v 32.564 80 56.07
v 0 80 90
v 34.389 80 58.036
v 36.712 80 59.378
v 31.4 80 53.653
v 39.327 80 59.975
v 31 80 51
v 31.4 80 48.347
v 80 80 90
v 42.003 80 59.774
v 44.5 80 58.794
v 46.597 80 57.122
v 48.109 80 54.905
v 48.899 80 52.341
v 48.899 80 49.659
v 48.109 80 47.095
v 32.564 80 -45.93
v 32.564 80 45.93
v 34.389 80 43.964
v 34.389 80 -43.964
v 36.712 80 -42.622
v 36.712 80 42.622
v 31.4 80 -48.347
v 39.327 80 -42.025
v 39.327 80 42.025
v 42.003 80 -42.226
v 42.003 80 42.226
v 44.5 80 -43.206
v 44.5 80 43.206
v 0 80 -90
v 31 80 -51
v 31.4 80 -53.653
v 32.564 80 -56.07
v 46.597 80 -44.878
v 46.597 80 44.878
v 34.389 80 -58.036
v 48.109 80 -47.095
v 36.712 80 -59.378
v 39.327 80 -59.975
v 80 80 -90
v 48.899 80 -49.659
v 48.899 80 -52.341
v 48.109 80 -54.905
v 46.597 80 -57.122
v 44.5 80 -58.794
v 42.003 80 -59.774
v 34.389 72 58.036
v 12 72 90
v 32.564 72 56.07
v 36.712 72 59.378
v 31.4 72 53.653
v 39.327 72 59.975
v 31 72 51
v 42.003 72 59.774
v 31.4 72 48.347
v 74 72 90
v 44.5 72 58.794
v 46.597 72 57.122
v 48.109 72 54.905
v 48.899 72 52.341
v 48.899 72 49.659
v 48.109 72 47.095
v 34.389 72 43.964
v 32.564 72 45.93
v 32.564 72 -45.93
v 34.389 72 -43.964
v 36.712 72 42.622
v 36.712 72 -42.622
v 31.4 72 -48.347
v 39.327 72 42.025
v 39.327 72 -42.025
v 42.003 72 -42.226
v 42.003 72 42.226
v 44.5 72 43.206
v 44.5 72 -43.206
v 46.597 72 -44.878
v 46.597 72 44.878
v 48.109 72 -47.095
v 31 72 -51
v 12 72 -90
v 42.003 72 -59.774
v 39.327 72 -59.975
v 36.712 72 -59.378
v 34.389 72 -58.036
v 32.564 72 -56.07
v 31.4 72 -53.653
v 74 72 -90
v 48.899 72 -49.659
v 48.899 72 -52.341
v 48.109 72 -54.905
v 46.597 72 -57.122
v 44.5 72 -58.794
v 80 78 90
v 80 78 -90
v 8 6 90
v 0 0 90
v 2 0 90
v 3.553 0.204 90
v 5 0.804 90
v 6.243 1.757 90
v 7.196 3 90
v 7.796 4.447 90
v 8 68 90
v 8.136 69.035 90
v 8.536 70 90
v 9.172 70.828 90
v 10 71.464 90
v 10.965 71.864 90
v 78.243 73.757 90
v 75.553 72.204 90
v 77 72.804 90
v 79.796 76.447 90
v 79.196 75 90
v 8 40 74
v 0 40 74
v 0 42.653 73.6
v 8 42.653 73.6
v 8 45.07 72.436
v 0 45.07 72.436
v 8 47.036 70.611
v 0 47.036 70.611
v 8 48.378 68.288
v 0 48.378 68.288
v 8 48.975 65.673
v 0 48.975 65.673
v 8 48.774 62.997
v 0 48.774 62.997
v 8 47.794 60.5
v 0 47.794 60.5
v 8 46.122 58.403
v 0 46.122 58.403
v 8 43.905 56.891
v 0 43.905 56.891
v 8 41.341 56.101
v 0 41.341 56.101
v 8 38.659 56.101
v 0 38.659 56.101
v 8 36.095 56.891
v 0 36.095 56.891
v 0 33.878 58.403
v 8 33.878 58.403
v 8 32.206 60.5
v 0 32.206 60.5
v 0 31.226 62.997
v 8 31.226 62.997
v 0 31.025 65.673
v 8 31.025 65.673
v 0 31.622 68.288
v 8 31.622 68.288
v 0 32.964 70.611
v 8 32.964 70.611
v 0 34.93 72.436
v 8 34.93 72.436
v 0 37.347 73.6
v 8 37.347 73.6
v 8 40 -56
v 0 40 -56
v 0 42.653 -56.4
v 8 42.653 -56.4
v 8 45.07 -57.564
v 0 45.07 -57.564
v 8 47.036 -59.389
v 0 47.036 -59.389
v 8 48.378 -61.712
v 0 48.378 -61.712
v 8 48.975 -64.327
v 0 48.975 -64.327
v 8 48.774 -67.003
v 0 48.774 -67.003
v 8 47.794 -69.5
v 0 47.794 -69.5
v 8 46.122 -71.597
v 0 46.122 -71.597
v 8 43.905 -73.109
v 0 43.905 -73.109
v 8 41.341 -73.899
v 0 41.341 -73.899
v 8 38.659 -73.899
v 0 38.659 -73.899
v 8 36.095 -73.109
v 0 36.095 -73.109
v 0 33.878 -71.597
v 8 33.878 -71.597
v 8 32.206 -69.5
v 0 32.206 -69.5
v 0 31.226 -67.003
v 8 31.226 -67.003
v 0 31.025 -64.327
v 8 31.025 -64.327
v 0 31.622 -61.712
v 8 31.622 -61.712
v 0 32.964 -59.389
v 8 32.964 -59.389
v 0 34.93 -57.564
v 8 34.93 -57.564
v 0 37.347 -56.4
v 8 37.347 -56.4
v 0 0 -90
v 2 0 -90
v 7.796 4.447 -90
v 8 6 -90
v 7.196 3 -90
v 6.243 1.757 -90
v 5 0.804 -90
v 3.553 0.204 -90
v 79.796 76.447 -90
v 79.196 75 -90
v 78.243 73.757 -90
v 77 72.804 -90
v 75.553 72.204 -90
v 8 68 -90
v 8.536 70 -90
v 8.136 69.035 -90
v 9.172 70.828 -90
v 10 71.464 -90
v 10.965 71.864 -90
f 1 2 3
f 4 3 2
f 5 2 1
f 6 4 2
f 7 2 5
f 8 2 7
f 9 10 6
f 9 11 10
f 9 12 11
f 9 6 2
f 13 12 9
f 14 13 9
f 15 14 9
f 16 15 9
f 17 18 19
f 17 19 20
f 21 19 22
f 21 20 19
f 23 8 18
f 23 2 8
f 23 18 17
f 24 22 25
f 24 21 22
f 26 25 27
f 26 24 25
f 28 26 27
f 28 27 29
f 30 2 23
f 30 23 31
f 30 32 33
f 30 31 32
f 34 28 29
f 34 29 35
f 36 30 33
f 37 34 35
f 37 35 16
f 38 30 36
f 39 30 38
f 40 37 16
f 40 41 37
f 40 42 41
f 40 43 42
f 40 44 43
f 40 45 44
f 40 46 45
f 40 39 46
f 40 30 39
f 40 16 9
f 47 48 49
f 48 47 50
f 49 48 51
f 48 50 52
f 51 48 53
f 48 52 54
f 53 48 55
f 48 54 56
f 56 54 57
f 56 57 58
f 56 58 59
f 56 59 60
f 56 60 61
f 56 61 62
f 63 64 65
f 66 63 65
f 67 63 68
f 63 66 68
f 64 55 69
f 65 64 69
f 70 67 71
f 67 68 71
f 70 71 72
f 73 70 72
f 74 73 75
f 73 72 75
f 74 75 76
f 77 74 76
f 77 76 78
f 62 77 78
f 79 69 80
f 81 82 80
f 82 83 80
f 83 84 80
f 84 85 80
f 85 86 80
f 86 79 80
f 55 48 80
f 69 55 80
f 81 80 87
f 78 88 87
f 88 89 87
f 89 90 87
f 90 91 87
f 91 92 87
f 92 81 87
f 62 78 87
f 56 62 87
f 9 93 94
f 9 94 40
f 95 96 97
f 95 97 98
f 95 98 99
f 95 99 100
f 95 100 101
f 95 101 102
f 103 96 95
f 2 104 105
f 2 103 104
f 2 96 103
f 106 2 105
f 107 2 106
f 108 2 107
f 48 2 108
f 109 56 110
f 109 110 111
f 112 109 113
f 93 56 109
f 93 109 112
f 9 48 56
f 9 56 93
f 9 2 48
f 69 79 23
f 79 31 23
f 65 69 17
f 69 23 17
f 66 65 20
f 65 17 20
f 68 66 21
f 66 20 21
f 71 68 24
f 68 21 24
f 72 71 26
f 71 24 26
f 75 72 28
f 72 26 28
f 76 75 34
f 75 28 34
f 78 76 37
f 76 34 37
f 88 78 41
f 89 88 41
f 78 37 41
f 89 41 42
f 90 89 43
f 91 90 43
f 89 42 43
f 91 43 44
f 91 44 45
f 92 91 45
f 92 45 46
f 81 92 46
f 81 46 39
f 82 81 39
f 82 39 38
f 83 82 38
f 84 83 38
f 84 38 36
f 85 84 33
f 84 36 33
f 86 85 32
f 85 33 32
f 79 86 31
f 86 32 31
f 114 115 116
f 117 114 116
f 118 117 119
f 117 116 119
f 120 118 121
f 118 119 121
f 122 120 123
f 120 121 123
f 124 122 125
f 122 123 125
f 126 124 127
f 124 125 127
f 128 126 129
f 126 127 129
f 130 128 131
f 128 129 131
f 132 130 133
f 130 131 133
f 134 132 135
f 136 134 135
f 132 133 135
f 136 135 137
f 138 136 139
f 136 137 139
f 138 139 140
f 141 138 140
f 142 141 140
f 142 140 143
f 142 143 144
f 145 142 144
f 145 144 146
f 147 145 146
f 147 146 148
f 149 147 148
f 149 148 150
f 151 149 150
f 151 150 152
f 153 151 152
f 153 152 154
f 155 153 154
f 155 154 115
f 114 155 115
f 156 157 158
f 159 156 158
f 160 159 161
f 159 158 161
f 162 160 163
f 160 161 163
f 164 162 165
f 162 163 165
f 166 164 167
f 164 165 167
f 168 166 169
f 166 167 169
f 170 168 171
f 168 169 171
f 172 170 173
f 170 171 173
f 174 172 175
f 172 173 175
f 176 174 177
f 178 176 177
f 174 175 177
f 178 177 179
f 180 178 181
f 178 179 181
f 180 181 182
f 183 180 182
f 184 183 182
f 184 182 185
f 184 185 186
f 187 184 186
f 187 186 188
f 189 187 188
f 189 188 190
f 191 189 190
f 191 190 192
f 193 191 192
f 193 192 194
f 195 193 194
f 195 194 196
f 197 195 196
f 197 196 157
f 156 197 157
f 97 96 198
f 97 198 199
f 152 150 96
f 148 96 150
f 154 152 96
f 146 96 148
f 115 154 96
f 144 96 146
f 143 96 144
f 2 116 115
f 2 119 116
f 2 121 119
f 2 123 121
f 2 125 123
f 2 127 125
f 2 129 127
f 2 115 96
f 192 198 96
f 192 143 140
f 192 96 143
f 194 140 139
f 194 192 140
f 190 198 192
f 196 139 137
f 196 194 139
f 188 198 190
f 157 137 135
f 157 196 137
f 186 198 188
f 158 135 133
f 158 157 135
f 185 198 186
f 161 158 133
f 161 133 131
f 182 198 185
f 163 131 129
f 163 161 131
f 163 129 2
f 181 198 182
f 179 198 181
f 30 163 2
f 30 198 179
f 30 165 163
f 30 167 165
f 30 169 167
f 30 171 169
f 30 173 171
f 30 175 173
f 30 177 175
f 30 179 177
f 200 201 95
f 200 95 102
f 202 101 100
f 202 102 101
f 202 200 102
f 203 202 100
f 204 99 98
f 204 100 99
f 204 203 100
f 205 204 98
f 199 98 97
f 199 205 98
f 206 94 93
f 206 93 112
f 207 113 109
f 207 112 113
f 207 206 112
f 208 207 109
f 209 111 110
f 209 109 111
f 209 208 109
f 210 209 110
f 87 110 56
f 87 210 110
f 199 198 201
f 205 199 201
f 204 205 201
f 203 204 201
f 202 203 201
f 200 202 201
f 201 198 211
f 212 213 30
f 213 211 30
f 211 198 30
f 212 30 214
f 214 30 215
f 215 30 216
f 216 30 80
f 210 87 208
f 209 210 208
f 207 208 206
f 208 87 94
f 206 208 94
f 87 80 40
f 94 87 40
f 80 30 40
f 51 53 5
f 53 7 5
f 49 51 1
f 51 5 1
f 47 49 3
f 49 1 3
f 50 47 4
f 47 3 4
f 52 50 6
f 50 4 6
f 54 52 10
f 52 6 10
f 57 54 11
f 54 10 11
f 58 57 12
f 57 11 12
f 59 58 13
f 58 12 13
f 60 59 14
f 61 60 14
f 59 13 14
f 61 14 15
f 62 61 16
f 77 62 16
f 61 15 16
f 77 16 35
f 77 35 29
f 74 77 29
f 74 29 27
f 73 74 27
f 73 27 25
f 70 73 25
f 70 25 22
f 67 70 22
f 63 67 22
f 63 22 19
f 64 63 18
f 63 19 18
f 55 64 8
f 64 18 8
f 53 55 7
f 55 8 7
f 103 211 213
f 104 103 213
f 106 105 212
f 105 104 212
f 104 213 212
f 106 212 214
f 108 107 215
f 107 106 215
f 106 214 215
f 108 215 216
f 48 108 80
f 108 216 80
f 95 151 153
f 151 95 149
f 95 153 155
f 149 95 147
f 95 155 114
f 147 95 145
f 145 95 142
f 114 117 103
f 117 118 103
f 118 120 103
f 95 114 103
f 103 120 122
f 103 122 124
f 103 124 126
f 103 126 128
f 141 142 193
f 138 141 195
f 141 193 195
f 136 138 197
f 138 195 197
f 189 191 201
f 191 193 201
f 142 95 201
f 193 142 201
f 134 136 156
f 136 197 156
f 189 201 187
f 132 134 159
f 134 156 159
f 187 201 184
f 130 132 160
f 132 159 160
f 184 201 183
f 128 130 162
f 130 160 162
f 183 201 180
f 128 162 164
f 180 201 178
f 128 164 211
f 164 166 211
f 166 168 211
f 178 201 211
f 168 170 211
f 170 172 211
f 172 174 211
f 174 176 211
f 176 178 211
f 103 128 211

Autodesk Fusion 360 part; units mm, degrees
sketch "Sketch1" plane through (0, 0, 0) normal (0, 0, 1) x (1, 0, 0)
  line L0 (0, 0) -> (0, 80)
  line L1 (0, 80) -> (80, 80)
  line L2 (8, 6) -> (8, 68)
  line L3 (12, 72) -> (74, 72)
  line L4 (80, 78) -> (80, 80)
  line L5 (0, 0) -> (2, 0)
  arc A0 (74, 72) -> (80, 78) centre (74, 78) ccw
  arc A1 (2, 0) -> (8, 6) centre (2, 6) ccw
  arc A2 (12, 72) -> (8, 68) centre (12, 68) ccw
  dimension "d1" = 80
  dimension "d2" = 80
  dimension "d4" = 6
  dimension "d5" = 6
  dimension "d6" = 4
extrude "Extrude1" add sketch "Sketch1" along normal mid plane 180
sketch "Sketch2" plane through (0, 0, 0) normal (-1, 0, 0) x (0, 0, 1)
  line L0 (-90, 0) -> (90, 0) construction
  line L1 (90, 0) -> (90, 80) construction
  line L2 (90, 80) -> (-90, 80) construction
  line L3 (-90, 80) -> (-90, 0) construction
  line L4 (-90, 80) -> (90, 80) construction
  line L5 (-90, 0) -> (-90, 80) construction
  line L6 (-90, 0) -> (90, 0) construction
  line L7 (90, 80) -> (90, 0) construction
  line L8 (-90, 40) -> (90, 40) construction
  line L9 (0, 80) -> (0, 0) construction
  circle A0 centre (-65, 40) radius 9
  circle A1 centre (65, 40) radius 9
  dimension "d9" = 18
  dimension "d10" = 65
extrude "Extrude2" cut sketch "Sketch2" against normal through all
sketch "Sketch3" plane through (0, 80, 0) normal (0, 1, 0) x (-1, 0, 0)
  line L0 (0, -90) -> (0, 90) construction
  line L1 (0, 90) -> (-80, 90) construction
  line L2 (-80, 90) -> (-80, -90) construction
  line L3 (-80, -90) -> (0, -90) construction
  line L4 (-80, 90) -> (0, 90) construction
  line L5 (-80, -90) -> (-80, 90) construction
  line L6 (0, -90) -> (0, 90) construction
  line L7 (0, -90) -> (-80, -90) construction
  line L8 (-80, 0) -> (0, 0) construction
  line L9 (-40, -90) -> (-40, 90) construction
  circle A0 centre (-40, -51) radius 9
  circle A1 centre (-40, 51) radius 9
  dimension "d12" = 18
  dimension "d13" = 51
extrude "Extrude3" cut sketch "Sketch3" against normal through all
equation "d13 = ( 102 / 2 ) * 1 mm"
